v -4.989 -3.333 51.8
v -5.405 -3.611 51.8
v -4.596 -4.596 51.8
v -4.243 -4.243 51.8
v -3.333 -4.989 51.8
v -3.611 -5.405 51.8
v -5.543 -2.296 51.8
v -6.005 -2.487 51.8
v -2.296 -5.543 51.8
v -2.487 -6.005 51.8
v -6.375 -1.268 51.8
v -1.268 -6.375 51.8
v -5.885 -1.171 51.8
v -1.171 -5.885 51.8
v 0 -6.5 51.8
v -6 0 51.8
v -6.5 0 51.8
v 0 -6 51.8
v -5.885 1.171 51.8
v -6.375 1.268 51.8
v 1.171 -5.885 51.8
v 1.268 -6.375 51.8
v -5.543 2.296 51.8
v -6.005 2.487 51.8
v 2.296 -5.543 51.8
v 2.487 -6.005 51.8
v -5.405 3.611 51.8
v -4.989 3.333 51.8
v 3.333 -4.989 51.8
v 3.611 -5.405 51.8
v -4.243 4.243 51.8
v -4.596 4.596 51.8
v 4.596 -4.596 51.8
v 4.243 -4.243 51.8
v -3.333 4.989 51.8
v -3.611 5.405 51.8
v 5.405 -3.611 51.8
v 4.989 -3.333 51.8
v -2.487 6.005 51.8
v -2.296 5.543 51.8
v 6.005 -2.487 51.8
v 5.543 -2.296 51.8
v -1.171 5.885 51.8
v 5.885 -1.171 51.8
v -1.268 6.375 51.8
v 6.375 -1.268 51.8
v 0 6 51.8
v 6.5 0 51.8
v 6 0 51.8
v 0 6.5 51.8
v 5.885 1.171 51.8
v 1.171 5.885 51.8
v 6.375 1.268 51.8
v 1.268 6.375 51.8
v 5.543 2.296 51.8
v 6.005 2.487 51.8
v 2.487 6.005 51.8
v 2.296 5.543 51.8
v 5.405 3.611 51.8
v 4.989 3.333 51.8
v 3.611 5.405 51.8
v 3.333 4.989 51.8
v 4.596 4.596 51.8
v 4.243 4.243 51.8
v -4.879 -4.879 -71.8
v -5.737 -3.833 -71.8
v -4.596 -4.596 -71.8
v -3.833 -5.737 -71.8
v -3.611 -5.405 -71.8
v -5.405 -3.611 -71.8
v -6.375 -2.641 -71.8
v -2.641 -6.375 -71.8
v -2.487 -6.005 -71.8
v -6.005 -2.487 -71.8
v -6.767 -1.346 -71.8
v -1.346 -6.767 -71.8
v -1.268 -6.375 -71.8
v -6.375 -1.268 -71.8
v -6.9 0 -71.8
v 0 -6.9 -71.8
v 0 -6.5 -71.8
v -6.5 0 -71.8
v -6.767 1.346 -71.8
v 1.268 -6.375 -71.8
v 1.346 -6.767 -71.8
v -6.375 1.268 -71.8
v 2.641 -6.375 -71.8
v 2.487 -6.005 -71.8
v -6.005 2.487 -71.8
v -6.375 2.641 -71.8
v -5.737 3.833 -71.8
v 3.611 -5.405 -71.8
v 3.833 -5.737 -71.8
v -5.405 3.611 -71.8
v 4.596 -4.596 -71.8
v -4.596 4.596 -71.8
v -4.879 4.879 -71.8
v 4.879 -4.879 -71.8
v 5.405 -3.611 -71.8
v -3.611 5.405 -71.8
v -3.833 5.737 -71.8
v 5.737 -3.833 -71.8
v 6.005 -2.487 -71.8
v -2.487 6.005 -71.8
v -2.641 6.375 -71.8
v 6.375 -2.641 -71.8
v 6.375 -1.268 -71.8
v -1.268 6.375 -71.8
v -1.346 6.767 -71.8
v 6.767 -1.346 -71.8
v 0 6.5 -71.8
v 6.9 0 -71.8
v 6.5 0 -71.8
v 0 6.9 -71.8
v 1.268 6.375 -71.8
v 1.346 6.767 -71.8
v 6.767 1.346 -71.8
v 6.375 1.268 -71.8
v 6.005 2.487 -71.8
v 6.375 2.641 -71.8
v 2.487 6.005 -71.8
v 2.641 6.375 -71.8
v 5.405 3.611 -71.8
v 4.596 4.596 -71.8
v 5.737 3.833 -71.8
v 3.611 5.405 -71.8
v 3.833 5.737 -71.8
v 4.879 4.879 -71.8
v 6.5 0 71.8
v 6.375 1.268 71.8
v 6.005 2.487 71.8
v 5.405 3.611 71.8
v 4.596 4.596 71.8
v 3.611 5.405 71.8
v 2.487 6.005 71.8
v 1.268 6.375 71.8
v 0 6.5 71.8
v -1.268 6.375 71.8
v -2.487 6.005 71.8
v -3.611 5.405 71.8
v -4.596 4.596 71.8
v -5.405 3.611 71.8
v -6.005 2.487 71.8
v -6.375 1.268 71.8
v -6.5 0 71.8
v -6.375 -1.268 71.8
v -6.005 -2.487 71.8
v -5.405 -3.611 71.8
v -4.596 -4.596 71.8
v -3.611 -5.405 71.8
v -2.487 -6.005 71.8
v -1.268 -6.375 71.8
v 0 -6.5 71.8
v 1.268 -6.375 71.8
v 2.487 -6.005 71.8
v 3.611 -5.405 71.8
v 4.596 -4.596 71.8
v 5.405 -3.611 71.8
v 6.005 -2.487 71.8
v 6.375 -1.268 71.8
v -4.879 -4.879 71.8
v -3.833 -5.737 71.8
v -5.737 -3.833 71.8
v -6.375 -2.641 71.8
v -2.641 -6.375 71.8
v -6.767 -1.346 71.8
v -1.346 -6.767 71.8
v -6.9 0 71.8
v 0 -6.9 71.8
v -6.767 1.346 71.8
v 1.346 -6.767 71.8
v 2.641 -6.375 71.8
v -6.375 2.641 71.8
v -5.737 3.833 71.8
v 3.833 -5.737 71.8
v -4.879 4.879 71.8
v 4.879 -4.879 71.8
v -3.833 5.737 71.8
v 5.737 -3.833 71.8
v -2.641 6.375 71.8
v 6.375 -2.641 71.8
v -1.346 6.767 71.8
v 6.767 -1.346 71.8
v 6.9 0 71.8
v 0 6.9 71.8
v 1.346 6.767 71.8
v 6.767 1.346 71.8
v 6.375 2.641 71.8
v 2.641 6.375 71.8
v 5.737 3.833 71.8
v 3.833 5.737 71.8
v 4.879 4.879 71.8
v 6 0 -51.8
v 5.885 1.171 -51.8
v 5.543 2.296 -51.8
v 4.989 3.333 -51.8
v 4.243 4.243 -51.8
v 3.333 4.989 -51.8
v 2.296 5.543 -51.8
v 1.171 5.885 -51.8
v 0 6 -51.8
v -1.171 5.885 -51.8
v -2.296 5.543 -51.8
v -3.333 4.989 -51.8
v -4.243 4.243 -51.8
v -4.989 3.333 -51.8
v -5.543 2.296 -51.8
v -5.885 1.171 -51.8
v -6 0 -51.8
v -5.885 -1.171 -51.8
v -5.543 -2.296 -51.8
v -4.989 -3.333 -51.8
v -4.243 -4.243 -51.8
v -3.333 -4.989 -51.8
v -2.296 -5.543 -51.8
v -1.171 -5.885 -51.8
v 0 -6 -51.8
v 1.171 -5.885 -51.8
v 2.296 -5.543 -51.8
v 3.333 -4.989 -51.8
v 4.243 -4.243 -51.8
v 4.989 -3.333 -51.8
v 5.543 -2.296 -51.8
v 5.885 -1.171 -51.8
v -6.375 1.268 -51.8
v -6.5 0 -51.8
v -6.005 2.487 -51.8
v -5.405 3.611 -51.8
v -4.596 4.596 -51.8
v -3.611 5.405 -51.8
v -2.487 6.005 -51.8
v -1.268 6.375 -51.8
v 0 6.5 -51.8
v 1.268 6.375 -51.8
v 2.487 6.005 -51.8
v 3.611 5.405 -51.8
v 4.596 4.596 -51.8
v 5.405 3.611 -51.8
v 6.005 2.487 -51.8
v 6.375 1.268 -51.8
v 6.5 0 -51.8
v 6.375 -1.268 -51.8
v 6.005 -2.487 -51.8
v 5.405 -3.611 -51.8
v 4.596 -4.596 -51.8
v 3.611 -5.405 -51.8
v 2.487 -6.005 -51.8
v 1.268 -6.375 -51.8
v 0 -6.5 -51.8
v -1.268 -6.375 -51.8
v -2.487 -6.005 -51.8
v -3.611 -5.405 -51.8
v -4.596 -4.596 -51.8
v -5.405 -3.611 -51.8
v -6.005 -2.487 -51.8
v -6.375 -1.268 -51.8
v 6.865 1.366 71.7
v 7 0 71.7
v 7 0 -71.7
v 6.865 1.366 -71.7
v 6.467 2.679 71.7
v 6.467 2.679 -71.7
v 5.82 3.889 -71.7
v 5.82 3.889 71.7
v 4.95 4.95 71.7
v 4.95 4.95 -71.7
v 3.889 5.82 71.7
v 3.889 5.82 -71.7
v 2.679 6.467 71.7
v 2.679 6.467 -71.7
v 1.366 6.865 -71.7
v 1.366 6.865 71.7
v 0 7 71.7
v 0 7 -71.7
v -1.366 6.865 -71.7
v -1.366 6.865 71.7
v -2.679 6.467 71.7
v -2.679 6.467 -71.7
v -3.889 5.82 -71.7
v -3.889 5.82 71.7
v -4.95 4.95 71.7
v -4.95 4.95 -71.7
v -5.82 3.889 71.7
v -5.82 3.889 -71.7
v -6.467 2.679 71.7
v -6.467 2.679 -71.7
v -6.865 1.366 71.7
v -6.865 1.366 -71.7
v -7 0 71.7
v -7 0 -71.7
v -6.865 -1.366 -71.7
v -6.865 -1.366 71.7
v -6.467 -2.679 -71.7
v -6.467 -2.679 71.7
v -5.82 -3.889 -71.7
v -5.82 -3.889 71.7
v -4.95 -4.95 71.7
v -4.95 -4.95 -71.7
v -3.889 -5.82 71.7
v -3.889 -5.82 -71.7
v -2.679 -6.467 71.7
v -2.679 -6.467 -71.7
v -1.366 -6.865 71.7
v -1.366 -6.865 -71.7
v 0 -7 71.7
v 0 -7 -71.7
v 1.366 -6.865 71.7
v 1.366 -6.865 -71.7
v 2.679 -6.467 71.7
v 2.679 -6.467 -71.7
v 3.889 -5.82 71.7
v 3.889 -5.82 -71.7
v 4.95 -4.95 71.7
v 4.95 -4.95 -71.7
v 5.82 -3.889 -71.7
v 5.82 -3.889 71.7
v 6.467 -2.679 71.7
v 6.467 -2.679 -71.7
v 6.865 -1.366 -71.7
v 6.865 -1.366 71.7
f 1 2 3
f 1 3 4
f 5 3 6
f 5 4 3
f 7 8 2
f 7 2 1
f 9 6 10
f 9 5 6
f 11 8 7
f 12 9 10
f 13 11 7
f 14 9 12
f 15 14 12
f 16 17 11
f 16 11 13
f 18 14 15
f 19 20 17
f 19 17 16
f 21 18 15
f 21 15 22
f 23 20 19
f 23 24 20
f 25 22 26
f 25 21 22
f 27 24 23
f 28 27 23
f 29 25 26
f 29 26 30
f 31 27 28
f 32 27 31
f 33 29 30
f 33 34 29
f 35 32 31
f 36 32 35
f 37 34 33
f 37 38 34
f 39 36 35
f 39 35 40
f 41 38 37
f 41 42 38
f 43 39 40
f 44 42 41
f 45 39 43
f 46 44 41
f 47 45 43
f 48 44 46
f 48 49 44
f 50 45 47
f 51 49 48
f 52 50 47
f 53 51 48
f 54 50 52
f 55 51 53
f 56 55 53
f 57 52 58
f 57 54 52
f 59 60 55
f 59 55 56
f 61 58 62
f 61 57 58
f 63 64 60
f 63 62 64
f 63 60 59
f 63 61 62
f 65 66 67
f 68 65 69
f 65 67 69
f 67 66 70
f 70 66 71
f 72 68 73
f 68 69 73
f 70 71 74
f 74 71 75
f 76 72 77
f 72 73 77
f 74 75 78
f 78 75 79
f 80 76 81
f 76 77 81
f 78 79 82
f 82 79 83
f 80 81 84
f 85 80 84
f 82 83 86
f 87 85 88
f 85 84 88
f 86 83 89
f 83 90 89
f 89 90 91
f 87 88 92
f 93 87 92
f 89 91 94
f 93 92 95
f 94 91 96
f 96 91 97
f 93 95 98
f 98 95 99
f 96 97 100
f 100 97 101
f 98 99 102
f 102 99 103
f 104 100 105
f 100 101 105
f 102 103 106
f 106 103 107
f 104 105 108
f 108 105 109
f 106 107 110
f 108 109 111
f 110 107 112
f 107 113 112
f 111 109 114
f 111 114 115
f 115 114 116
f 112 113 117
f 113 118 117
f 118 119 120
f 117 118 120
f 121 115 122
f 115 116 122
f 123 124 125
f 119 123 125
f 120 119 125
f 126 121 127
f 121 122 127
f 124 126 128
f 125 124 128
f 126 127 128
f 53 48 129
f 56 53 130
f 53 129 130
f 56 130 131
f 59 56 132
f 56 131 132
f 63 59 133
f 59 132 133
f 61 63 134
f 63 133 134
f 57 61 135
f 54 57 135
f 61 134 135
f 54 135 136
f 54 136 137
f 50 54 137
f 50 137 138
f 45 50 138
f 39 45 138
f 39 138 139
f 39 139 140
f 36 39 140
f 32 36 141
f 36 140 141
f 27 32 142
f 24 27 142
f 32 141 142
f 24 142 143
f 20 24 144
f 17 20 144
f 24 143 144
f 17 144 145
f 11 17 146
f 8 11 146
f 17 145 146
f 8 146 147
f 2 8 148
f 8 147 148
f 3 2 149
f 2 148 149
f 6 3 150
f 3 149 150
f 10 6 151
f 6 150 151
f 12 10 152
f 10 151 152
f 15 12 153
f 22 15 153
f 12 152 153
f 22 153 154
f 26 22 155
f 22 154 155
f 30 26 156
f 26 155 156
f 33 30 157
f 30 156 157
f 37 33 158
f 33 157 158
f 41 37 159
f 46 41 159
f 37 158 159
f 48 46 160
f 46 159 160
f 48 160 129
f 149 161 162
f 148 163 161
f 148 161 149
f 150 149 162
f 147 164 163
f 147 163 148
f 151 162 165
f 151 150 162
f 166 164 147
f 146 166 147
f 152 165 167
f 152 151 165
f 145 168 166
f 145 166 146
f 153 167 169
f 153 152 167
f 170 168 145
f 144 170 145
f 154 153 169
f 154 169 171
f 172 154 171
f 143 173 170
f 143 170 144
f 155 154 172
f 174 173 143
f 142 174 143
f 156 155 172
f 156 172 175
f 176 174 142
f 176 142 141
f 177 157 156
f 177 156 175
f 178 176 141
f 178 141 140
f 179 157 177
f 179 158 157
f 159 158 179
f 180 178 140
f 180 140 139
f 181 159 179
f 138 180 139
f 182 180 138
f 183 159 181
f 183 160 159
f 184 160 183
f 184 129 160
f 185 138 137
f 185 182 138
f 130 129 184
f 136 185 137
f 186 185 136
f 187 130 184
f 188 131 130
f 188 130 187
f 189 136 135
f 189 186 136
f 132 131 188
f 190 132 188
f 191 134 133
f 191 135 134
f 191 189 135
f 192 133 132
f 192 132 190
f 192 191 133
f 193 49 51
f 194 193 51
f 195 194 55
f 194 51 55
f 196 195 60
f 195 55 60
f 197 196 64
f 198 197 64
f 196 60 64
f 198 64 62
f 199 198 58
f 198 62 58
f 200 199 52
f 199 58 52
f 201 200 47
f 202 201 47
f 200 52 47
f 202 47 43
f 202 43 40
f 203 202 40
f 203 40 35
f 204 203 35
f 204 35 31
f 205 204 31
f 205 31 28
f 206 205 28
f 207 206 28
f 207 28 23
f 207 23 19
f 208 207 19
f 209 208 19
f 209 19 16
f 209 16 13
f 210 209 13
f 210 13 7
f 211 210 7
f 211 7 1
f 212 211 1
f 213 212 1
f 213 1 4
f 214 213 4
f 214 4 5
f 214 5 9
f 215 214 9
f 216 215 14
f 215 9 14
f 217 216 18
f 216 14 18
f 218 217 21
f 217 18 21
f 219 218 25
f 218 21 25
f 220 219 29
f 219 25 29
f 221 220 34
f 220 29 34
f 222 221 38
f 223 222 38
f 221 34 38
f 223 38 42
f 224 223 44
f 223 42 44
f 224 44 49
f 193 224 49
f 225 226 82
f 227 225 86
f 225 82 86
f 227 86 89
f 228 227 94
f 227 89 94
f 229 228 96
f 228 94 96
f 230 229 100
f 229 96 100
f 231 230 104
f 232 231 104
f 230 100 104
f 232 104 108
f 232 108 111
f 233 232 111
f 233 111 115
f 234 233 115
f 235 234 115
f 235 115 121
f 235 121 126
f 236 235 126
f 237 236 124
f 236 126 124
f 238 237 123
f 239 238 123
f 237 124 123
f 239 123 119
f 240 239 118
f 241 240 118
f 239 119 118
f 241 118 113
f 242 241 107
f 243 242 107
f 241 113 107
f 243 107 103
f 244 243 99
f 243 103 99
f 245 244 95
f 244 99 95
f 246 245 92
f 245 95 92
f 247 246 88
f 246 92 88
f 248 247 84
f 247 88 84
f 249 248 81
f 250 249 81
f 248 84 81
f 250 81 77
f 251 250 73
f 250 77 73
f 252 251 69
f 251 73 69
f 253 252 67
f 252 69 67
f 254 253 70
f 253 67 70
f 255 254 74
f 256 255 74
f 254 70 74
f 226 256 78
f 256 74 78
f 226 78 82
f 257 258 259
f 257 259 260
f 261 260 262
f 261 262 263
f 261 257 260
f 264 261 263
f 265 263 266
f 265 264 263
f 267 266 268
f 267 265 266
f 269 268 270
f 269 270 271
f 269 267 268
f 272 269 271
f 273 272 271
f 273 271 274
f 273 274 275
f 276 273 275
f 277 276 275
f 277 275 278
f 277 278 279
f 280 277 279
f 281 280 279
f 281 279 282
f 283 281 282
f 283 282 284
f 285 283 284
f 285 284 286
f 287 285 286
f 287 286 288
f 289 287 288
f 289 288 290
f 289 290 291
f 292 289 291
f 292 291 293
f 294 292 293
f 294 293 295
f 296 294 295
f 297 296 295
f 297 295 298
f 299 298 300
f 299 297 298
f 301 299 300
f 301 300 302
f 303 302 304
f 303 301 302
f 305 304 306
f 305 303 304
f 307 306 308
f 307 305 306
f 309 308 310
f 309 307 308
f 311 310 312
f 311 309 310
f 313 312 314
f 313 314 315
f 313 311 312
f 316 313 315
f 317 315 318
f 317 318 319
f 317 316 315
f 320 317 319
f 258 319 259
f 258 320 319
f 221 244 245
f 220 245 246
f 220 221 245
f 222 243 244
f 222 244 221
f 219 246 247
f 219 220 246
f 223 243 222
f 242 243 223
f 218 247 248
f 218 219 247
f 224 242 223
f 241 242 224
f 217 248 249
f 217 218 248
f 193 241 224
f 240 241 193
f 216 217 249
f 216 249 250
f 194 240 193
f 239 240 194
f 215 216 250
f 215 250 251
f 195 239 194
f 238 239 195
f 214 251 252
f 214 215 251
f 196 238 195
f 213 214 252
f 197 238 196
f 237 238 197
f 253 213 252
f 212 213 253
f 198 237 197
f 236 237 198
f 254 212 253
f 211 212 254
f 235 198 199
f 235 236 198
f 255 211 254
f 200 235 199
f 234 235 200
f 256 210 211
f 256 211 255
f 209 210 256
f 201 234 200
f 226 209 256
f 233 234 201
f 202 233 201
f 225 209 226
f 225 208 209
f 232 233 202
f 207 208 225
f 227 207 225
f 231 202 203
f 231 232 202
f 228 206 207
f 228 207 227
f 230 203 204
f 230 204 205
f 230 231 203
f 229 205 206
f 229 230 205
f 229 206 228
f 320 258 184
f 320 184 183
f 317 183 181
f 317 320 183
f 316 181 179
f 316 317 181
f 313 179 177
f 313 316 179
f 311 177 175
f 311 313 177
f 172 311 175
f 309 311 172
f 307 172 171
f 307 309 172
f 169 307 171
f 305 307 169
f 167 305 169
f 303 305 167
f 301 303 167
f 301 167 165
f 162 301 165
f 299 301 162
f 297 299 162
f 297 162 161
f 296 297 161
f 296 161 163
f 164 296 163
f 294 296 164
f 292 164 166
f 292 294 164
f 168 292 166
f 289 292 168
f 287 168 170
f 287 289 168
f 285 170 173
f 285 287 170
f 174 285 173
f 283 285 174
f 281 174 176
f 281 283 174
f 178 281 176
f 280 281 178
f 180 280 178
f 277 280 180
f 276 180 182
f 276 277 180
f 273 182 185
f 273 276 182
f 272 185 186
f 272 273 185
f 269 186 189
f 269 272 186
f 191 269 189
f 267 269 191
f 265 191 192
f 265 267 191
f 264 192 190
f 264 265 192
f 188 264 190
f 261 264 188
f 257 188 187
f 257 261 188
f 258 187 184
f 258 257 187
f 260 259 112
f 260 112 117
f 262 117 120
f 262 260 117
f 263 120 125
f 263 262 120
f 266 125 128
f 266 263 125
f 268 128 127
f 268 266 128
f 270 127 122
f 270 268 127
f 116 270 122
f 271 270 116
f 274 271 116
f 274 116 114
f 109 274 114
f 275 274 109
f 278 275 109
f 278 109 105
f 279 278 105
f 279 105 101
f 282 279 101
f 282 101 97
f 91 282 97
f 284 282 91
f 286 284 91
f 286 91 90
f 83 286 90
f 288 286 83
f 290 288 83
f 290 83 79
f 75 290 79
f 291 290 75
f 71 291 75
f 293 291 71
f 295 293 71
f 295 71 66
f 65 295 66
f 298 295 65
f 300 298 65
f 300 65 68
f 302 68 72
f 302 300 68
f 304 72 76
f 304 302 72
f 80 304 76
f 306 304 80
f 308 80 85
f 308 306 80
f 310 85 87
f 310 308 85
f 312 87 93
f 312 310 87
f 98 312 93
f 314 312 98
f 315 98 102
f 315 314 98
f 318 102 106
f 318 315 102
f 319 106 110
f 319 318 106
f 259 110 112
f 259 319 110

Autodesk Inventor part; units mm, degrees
ref_plane "YZ Plane" through (0, 0, 0) normal (1, 0, 0) x (0, 1, 0)
ref_plane "XZ Plane" through (0, 0, 0) normal (0, 1, 0) x (-1, 0, 0)
ref_plane "XY Plane" through (0, 0, 0) normal (0, 0, 1) x (1, 0, 0)
sketch "Sketch1" plane through (0, 0, 0) normal (0, 0, 1) x (1, 0, 0)
  circle A0 centre (0, 0) radius 6
  circle A1 centre (0, 0) radius 7
  dimension "d0" = 12
  dimension "d1" = 14
extrude "Extrusion1" add sketch "Sketch1" against normal mid plane 143.6
chamfer "Chamfer1" distance 0.1 angle 45 4 edges at (-6, 0, 71.8) (-7, 0, 71.8) (-7, 0, -71.8) (-6, 0, -71.8)
sketch "Sketch2" plane through (0, 0, 71.8) normal (0, 0, 1) x (1, 0, 0)
  circle A0 centre (0, 0) radius 6.5
  circle A1 centre (0, 0) radius 6
  dimension "d7" = 13
  dimension "d8" = 12
extrude "Extrusion2" cut sketch "Sketch2" against normal blind 20
sketch "Sketch3" plane through (0, 0, -71.8) normal (0, 0, -1) x (-1, 0, 0)
  circle A0 centre (0, 0) radius 6.5
  dimension "d11" = 13
extrude "Extrusion3" cut sketch "Sketch3" against normal blind 20
properties part number "Joint0_Joint1_Bushing"
